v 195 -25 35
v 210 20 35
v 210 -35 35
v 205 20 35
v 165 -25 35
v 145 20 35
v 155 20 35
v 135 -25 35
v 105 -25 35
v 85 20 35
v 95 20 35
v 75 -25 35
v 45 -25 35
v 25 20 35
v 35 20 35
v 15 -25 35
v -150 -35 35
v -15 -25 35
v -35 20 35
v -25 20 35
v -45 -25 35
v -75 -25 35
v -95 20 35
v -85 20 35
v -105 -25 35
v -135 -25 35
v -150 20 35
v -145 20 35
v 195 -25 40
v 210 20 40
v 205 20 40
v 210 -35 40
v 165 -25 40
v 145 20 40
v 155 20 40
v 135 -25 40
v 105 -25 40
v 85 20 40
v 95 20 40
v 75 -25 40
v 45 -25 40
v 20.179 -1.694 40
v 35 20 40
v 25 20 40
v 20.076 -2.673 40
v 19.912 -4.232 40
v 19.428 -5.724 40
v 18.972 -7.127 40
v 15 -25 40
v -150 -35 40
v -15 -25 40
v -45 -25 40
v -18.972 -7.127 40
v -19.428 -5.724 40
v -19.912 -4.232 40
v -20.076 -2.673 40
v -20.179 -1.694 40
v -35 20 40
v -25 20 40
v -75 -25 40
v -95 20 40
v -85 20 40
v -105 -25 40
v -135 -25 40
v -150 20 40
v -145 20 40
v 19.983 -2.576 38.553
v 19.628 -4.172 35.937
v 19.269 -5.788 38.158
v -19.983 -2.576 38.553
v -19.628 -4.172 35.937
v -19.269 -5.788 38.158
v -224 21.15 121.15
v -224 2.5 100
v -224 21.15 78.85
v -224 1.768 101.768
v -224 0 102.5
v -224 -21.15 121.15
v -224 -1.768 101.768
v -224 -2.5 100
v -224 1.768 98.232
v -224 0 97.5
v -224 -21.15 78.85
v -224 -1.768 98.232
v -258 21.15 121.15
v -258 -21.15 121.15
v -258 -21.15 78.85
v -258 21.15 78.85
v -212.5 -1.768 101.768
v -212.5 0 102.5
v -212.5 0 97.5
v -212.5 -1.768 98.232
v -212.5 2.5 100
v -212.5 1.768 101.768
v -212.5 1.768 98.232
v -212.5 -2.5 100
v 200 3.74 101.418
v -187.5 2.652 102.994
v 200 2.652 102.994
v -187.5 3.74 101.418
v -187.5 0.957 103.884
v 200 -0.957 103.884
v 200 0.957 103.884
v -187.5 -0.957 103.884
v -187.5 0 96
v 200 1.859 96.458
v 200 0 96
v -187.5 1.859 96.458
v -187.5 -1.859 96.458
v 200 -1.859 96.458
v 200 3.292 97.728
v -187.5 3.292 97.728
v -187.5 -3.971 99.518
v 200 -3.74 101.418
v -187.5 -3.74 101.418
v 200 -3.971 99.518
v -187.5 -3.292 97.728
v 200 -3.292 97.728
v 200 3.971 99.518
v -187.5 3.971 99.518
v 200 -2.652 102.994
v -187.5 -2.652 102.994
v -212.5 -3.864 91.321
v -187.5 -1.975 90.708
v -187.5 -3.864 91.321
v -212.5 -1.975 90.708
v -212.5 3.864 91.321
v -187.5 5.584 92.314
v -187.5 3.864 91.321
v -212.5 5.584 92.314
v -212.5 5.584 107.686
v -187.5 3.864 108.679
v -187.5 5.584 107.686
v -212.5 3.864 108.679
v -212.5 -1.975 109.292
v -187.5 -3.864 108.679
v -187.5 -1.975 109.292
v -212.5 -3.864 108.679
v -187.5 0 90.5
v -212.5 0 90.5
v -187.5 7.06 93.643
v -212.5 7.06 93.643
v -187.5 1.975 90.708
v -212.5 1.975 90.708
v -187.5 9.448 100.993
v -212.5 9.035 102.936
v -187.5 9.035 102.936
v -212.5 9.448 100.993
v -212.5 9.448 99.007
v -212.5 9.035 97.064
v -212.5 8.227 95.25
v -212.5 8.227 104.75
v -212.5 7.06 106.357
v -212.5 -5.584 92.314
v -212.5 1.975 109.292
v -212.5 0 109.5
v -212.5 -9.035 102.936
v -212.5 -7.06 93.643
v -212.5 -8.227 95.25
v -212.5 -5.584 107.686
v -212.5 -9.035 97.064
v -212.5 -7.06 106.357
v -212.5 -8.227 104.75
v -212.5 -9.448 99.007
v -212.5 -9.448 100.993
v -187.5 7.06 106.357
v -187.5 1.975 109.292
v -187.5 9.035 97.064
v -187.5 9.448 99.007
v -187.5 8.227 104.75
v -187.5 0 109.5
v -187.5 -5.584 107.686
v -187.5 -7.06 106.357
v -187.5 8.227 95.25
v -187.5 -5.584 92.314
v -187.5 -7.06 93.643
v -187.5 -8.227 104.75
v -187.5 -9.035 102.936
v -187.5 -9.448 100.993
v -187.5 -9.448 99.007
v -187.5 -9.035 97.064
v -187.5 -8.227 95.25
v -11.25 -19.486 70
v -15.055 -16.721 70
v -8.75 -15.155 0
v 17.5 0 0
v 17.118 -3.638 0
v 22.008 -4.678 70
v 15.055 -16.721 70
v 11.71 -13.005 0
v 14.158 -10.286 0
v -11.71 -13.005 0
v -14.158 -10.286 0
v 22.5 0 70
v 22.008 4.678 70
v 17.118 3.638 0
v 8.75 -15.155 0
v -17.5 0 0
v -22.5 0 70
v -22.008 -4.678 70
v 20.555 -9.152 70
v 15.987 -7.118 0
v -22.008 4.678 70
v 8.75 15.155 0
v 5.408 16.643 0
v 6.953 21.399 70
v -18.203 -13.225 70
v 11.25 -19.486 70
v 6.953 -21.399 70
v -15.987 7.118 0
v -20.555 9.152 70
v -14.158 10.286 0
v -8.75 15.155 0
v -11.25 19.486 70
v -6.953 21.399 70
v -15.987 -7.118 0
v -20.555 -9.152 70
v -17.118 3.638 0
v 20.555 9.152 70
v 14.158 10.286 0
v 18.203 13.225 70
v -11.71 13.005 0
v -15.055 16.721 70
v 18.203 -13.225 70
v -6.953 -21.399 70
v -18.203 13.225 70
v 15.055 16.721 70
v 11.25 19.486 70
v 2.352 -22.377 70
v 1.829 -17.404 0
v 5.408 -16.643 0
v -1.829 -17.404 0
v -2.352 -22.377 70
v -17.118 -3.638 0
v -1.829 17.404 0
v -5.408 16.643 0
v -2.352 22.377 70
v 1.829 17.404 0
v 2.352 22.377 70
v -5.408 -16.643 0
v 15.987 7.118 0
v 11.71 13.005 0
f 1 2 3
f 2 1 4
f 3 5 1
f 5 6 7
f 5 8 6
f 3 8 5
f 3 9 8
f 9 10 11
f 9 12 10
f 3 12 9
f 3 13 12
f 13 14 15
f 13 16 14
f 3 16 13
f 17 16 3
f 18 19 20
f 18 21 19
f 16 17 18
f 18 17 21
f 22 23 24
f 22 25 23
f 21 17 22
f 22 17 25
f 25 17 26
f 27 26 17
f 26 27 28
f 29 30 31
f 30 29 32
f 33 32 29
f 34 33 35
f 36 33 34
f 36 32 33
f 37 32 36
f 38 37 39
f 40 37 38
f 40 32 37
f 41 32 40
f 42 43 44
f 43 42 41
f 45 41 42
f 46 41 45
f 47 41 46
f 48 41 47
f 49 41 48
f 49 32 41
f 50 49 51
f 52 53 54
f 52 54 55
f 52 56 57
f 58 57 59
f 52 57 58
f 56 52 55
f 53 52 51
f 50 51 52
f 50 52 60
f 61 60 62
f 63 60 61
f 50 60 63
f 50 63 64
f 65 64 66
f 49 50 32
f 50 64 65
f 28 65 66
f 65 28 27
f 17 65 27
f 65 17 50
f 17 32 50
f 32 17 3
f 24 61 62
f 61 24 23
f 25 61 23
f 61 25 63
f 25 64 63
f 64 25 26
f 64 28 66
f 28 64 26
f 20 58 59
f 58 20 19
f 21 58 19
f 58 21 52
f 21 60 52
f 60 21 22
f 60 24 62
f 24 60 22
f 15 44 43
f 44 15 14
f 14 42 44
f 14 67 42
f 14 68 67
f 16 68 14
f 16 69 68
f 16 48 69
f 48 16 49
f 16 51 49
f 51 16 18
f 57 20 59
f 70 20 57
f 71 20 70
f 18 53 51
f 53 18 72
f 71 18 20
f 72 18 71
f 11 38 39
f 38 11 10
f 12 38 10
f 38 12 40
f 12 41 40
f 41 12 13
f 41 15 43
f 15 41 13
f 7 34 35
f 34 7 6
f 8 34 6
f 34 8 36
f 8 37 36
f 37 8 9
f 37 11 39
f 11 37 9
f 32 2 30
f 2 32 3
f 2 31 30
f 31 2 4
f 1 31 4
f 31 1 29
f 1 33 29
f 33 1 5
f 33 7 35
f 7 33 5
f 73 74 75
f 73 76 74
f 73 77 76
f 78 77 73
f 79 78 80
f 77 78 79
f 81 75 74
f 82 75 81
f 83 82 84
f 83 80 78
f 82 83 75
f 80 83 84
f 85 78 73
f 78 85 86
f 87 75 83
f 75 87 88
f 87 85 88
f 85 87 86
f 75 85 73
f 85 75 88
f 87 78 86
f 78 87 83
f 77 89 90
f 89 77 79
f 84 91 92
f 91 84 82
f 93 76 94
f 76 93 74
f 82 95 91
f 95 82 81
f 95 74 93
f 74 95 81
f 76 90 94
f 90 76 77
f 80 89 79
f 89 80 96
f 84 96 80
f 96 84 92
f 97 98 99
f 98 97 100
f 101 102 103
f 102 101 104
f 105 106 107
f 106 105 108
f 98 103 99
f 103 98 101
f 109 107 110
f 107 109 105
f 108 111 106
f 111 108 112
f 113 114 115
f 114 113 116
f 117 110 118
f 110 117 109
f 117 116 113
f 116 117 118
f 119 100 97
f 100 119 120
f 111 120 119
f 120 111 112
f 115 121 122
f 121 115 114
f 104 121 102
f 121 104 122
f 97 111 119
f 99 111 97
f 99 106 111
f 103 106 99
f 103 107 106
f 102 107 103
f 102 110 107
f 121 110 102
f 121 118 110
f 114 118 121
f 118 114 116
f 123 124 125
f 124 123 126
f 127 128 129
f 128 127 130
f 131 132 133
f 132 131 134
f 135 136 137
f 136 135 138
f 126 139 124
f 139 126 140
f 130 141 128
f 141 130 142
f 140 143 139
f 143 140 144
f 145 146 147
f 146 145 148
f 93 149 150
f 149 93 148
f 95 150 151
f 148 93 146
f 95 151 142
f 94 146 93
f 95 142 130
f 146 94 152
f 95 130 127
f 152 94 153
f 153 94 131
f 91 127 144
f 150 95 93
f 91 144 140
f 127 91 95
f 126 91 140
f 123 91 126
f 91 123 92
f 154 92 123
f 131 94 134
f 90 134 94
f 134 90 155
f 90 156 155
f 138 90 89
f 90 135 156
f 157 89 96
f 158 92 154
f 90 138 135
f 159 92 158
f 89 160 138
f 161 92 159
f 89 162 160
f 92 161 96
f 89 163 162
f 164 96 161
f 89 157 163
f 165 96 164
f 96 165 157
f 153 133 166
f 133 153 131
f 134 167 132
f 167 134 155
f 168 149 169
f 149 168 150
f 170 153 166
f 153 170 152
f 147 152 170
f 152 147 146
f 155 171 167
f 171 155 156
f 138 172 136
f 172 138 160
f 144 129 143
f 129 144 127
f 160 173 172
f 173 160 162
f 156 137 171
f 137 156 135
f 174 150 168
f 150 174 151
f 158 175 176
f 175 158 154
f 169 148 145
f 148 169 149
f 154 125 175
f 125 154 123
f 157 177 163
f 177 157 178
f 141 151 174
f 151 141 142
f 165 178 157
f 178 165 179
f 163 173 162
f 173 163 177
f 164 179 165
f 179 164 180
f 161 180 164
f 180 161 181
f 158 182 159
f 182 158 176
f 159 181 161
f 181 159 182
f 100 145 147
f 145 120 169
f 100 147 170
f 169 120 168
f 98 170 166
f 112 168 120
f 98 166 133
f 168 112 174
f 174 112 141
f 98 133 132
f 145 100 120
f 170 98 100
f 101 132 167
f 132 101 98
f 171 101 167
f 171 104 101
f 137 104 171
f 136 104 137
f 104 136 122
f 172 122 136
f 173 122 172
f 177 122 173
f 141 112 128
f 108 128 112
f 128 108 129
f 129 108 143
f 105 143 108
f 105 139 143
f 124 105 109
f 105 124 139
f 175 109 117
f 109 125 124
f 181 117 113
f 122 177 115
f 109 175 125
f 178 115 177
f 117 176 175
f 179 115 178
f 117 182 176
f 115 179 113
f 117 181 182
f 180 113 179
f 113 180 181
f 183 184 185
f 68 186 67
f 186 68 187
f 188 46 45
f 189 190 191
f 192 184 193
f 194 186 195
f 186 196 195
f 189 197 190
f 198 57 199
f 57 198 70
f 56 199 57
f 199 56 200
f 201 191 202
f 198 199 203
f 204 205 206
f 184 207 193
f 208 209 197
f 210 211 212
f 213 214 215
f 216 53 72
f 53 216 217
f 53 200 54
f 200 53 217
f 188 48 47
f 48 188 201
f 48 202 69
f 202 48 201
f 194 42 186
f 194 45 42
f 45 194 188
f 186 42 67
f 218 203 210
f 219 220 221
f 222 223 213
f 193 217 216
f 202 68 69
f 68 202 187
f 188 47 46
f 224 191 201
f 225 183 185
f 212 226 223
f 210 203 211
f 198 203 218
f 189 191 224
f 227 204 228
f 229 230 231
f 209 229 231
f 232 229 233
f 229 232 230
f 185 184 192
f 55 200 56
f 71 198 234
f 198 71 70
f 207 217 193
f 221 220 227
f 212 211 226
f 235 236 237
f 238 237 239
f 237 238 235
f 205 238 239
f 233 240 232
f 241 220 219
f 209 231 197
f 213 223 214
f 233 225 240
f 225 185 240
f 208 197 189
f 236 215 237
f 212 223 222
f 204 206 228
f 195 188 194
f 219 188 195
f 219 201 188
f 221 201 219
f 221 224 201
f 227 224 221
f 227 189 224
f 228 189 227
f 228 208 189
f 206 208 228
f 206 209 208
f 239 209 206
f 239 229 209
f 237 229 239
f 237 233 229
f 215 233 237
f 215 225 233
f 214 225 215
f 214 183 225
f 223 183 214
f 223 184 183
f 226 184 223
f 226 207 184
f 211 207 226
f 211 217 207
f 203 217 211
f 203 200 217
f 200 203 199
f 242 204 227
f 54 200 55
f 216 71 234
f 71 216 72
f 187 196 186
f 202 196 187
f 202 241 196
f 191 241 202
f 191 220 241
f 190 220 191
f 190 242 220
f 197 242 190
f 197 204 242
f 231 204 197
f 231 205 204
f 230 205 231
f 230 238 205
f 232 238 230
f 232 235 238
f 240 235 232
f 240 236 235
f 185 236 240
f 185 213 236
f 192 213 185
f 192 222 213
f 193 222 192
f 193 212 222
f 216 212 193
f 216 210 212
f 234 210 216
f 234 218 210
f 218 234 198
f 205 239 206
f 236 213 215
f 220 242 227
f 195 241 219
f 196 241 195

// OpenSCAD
module glass() {
    cylinder(
        h=70,
        d1=35,
        d2=45
    );
}
module notch_half() {
    polygon([
        [-30,20],[-30,-35],[0,-35],
        [0,-25],[-15,-25],[-25,20]
    ]);
}
module notch() {
    linear_extrude(5) union() {
        notch_half();
        mirror([180,0,0]) notch_half();
    }
}
module notch_group() {
    for (i = [-2:3]) {
        translate([i*60,0,0]) notch();
    }
}
module leadscrew() {
    rotate([0,90,0]) cylinder(h=400, d=8, center=true);
}
module leadscrew_connector() {
    rotate([0,90,0]) cylinder(h=25, d=19, center=true);
}
module stepper_motor() {
    cube([34,42.3,42.3], center=true);
    translate([29,0,0]) rotate([0,90,0]) cylinder(h=24, d=5, center=true);
}
module leadscrew_setup() {
    leadscrew();
    translate([-200,0,0]) leadscrew_connector();
    translate([-241,0,0]) stepper_motor();
}

glass();
translate([0,0,35]) notch_group();
translate([0,0,100]) leadscrew_setup();
